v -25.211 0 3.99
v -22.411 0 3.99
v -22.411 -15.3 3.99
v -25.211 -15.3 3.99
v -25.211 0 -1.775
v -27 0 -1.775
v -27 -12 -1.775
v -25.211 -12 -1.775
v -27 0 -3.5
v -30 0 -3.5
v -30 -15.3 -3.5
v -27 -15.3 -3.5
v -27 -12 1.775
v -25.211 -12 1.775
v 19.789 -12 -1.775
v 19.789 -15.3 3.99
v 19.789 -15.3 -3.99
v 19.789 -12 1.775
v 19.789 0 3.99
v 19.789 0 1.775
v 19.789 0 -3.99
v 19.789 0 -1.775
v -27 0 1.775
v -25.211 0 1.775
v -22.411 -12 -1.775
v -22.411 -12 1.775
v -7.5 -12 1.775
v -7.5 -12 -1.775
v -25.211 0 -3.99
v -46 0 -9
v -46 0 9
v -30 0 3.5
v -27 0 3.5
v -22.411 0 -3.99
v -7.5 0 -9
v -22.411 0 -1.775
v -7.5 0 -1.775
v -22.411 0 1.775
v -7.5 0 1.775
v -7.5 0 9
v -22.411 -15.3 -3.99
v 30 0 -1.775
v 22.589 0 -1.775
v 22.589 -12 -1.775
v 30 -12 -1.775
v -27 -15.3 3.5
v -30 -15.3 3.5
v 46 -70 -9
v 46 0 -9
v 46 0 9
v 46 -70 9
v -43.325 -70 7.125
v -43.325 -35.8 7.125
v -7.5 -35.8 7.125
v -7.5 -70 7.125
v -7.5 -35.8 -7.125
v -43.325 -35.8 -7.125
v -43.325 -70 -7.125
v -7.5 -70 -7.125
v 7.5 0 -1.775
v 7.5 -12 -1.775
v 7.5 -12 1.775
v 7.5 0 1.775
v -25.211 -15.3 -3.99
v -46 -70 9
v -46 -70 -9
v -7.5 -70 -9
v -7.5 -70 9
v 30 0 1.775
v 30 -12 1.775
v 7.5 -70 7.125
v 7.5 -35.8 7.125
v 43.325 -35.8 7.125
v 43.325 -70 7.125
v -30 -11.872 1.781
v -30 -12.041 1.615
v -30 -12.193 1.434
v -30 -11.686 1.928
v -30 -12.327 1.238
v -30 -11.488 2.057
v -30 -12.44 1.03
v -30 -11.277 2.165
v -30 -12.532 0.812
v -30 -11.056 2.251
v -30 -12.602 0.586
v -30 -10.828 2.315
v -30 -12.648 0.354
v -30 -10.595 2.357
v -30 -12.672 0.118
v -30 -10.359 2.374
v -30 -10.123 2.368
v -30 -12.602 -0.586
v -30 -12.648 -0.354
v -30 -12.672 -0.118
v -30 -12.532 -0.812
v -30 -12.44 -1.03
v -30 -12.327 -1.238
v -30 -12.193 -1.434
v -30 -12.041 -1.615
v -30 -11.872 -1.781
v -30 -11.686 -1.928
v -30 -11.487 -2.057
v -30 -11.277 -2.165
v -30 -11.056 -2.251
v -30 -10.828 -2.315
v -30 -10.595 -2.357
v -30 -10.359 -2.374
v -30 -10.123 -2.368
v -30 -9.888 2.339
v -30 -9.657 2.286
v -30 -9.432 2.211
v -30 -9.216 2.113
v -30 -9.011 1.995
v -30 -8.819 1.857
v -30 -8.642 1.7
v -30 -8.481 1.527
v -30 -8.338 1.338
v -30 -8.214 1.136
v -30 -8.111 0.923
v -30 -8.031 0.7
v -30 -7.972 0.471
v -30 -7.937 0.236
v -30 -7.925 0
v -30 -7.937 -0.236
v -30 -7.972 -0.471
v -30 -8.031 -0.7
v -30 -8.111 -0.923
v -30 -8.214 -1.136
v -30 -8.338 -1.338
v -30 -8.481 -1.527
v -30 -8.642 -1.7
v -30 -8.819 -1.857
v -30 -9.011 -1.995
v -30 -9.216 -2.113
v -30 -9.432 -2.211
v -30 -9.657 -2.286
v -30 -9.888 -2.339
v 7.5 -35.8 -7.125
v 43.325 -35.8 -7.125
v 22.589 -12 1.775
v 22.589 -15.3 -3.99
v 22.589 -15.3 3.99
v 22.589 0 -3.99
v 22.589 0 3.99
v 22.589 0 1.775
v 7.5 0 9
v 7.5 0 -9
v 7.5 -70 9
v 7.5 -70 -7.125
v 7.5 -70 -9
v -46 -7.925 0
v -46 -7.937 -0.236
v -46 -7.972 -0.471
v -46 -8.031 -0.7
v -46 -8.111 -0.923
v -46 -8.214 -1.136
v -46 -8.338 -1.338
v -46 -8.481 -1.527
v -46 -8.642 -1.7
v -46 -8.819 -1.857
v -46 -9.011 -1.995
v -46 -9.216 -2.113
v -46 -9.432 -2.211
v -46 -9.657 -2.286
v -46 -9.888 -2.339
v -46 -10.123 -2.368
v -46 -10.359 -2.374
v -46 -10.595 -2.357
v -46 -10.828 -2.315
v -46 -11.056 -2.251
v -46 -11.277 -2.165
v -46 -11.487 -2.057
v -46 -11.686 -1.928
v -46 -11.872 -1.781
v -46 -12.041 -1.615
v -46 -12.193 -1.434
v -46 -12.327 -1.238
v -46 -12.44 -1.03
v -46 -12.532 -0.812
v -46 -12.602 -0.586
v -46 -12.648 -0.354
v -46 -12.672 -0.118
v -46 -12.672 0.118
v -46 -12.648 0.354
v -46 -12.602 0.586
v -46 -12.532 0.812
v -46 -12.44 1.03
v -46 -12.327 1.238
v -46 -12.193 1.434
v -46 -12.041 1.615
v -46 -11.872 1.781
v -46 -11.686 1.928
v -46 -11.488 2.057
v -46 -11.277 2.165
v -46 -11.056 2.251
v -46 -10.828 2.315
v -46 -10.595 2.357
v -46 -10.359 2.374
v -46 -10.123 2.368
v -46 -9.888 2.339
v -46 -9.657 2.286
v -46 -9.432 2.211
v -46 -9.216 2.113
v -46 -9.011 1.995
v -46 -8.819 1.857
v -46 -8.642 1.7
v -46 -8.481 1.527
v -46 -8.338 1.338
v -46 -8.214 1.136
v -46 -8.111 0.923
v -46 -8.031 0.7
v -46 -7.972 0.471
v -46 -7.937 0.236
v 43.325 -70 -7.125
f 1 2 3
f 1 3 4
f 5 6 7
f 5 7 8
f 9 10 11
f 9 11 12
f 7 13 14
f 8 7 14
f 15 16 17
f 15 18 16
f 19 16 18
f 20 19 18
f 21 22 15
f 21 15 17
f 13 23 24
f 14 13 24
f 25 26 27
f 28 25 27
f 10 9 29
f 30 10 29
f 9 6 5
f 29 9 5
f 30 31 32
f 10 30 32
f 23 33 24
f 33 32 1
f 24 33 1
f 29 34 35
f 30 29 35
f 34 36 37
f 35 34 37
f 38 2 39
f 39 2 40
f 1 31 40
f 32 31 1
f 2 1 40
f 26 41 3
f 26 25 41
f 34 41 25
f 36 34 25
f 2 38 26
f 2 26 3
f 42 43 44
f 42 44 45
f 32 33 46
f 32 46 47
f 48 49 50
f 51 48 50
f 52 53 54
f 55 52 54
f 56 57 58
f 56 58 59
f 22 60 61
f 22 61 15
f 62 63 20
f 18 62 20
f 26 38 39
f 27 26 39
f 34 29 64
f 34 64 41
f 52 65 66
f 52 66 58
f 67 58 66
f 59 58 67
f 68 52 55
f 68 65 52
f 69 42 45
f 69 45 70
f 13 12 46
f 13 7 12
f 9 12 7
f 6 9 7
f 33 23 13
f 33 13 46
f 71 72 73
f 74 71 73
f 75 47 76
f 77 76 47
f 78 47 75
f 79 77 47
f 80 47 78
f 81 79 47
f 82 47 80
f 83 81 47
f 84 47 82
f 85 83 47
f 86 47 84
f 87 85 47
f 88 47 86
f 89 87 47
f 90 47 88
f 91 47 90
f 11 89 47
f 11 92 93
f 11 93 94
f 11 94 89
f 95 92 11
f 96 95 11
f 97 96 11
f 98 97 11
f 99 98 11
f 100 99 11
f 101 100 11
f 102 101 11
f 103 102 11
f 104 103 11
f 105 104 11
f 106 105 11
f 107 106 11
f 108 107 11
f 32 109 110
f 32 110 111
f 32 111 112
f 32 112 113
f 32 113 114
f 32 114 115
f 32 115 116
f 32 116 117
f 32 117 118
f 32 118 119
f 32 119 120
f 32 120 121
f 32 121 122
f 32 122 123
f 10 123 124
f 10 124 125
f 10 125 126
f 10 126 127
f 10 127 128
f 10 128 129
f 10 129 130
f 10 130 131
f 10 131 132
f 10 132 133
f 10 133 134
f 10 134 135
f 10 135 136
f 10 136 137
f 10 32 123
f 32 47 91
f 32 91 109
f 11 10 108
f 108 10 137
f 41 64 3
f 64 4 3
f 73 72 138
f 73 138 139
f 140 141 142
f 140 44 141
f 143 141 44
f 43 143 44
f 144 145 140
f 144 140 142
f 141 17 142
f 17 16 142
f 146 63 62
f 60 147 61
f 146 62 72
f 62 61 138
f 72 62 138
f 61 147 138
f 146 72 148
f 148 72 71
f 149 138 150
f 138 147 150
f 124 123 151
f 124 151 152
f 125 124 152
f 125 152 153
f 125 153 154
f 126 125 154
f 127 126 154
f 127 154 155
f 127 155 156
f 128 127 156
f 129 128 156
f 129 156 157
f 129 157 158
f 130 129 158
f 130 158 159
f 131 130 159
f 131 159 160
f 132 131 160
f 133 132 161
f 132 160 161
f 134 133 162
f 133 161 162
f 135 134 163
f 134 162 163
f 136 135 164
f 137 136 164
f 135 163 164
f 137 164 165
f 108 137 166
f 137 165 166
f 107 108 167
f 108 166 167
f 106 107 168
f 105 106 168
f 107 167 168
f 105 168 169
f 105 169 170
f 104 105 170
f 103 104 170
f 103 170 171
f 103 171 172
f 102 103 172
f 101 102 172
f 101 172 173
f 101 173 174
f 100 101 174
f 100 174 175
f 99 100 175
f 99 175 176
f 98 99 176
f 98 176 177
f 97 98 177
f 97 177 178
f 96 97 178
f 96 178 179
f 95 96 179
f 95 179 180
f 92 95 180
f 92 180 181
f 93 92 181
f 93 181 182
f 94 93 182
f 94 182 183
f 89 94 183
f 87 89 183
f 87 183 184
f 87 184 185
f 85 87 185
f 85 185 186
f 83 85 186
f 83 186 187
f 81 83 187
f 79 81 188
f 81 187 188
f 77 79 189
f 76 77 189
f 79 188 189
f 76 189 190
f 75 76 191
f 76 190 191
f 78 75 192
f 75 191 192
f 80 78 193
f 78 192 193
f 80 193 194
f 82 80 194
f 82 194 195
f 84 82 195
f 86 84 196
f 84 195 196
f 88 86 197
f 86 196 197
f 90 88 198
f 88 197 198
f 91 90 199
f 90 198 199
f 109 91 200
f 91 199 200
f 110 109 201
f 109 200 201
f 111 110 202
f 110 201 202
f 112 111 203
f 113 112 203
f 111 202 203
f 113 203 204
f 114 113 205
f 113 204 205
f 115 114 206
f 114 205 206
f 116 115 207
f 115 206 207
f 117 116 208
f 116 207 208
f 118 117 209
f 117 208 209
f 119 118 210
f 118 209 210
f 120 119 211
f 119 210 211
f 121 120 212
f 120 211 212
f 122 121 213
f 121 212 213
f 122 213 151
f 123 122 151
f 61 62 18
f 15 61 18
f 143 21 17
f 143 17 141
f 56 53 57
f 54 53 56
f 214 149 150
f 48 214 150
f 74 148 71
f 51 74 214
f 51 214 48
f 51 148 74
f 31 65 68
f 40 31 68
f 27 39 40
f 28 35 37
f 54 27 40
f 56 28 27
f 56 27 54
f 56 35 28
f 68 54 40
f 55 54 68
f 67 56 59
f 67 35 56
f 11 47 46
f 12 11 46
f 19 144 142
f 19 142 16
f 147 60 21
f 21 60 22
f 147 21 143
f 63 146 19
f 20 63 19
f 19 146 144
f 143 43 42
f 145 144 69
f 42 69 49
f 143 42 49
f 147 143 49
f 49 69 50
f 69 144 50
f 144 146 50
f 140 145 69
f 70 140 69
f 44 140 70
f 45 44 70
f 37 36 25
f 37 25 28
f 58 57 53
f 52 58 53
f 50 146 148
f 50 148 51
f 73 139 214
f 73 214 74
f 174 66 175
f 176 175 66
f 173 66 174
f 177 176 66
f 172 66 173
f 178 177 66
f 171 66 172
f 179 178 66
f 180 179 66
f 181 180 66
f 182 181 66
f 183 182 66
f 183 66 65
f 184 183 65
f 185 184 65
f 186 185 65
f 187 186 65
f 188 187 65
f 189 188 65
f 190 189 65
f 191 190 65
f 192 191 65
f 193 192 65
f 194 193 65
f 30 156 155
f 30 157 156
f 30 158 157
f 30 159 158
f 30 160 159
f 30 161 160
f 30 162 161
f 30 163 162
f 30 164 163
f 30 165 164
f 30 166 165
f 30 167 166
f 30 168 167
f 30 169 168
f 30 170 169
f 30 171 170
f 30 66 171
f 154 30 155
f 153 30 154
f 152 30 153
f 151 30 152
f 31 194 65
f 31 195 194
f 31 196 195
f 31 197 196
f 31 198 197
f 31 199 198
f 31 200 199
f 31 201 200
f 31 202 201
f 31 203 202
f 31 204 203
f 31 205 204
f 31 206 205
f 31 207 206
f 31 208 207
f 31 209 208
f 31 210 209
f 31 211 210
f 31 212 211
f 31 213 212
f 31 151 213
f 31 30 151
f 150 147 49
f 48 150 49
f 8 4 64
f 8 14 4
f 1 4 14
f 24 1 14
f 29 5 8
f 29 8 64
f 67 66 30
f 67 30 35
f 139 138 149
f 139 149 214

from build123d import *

# Parameters (mm, degrees)
F0_W      = 92
F0_H      = 18
F0_W_2    = 86.65
F0_H_2    = 14.25
F1_DEPTH  = 70
F2_DEPTH  = 35.8
F4_W      = 13.3
F4_H      = 8.6
F5_DEPTH  = 22
F3_R      = 2
F6_DEPTH  = 8
F8_W      = 10.7813365757
F8_H      = 6.4464779571
F8_R      = 3.2
F9_DEPTH  = 9.9
F10_W     = 15
F10_H     = 70
F11_DEPTH = 24.4
F13_W     = 7.4110888749
F13_H     = 3.55
F13_W_2   = 42.2
F13_W_3   = 1.7889111251
F14_DEPTH = 12
F15_DEPTH = 15.3
F17_DEPTH = 16.6


with BuildPart() as f1:
    # F0 (on Front) → F1 (new body)
    with BuildSketch(Plane.XZ):
        Rectangle(F0_W, F0_H)
        Rectangle(F0_W_2, F0_H_2, mode=Mode.SUBTRACT)
    extrude(amount=F1_DEPTH)

    # F0 (on Front) → F2 (join)
    with BuildSketch(Plane.XZ):
        Rectangle(F0_W_2, F0_H_2)
    extrude(amount=F2_DEPTH)

    # F4 (on face) → F5 (cut)
    with BuildSketch(Plane.XZ.offset(35.8)):
        Rectangle(F4_W, F4_H)
    extrude(amount=-F5_DEPTH, mode=Mode.SUBTRACT)

    # F3 (on Front) → F6 (cut)
    with BuildSketch(Plane.XZ):
        Circle(F3_R)
    extrude(amount=F6_DEPTH, mode=Mode.SUBTRACT)

    # F8 (on face) → F9 (cut)
    with BuildSketch(Plane.XZ.offset(13.8)):
        with Locations((0, -0.695)):
            Rectangle(F8_W, F8_H)
        with Locations((0, -0.695)):
            Circle(F8_R, mode=Mode.SUBTRACT)
        with Locations((0, -0.695)):
            Circle(F8_R)
    extrude(amount=-F9_DEPTH, mode=Mode.SUBTRACT)

    # F10 (on face) → F11 (cut)
    with BuildSketch(Plane(origin=(0, 0, -9), x_dir=(1, 0, 0), z_dir=(0, 0, -1))):
        with Locations((0, 35)):
            Rectangle(F10_W, F10_H)
    extrude(amount=-F11_DEPTH, mode=Mode.SUBTRACT)

    # F13 (on face) → F14 (cut)
    with BuildSketch(Plane.XZ):
        with Locations((26.2944555625, 0)):
            Rectangle(F13_W, F13_H)
        with Locations((-1.3110888749, 0)):
            Rectangle(F13_W_2, F13_H)
        with Locations((-26.1055444375, 0)):
            Rectangle(F13_W_3, F13_H)
    extrude(amount=F14_DEPTH, mode=Mode.SUBTRACT)

    # F13 (on face) → F15 (cut)
    with BuildSketch(Plane.XZ):
        Polygon((19.7889111251, 1.775), (19.7889111251, -1.775), (19.7889111251, -3.99), (22.5889111251, -3.99), (22.5889111251, -1.775), (22.5889111251, 1.775), (22.5889111251, 3.99), (19.7889111251, 3.99), align=None)
        Polygon((-25.2110888749, 1.775), (-25.2110888749, -1.775), (-25.2110888749, -3.99), (-22.4110888749, -3.99), (-22.4110888749, -1.775), (-22.4110888749, 1.775), (-22.4110888749, 3.99), (-25.2110888749, 3.99), align=None)
        Polygon((-27, -3.5), (-27, -1.775), (-27, 1.775), (-27, 3.5), (-30, 3.5), (-30, 1.775), (-30, -1.775), (-30, -3.5), align=None)
    extrude(amount=F15_DEPTH, mode=Mode.SUBTRACT)

    # F16 (on face) → F17 (cut)
    with BuildSketch(Plane(origin=(-46, 0, 0), x_dir=(0, -1, 0), z_dir=(-1, 0, 0))):
        with BuildLine():
            ThreePointArc((12.675, 0), (10.3, 2.375), (7.925, 0))
            ThreePointArc((7.925, 0), (10.3, -2.375), (12.675, 0))
        make_face()
    extrude(amount=-F17_DEPTH, mode=Mode.SUBTRACT)


solid = f1.part
